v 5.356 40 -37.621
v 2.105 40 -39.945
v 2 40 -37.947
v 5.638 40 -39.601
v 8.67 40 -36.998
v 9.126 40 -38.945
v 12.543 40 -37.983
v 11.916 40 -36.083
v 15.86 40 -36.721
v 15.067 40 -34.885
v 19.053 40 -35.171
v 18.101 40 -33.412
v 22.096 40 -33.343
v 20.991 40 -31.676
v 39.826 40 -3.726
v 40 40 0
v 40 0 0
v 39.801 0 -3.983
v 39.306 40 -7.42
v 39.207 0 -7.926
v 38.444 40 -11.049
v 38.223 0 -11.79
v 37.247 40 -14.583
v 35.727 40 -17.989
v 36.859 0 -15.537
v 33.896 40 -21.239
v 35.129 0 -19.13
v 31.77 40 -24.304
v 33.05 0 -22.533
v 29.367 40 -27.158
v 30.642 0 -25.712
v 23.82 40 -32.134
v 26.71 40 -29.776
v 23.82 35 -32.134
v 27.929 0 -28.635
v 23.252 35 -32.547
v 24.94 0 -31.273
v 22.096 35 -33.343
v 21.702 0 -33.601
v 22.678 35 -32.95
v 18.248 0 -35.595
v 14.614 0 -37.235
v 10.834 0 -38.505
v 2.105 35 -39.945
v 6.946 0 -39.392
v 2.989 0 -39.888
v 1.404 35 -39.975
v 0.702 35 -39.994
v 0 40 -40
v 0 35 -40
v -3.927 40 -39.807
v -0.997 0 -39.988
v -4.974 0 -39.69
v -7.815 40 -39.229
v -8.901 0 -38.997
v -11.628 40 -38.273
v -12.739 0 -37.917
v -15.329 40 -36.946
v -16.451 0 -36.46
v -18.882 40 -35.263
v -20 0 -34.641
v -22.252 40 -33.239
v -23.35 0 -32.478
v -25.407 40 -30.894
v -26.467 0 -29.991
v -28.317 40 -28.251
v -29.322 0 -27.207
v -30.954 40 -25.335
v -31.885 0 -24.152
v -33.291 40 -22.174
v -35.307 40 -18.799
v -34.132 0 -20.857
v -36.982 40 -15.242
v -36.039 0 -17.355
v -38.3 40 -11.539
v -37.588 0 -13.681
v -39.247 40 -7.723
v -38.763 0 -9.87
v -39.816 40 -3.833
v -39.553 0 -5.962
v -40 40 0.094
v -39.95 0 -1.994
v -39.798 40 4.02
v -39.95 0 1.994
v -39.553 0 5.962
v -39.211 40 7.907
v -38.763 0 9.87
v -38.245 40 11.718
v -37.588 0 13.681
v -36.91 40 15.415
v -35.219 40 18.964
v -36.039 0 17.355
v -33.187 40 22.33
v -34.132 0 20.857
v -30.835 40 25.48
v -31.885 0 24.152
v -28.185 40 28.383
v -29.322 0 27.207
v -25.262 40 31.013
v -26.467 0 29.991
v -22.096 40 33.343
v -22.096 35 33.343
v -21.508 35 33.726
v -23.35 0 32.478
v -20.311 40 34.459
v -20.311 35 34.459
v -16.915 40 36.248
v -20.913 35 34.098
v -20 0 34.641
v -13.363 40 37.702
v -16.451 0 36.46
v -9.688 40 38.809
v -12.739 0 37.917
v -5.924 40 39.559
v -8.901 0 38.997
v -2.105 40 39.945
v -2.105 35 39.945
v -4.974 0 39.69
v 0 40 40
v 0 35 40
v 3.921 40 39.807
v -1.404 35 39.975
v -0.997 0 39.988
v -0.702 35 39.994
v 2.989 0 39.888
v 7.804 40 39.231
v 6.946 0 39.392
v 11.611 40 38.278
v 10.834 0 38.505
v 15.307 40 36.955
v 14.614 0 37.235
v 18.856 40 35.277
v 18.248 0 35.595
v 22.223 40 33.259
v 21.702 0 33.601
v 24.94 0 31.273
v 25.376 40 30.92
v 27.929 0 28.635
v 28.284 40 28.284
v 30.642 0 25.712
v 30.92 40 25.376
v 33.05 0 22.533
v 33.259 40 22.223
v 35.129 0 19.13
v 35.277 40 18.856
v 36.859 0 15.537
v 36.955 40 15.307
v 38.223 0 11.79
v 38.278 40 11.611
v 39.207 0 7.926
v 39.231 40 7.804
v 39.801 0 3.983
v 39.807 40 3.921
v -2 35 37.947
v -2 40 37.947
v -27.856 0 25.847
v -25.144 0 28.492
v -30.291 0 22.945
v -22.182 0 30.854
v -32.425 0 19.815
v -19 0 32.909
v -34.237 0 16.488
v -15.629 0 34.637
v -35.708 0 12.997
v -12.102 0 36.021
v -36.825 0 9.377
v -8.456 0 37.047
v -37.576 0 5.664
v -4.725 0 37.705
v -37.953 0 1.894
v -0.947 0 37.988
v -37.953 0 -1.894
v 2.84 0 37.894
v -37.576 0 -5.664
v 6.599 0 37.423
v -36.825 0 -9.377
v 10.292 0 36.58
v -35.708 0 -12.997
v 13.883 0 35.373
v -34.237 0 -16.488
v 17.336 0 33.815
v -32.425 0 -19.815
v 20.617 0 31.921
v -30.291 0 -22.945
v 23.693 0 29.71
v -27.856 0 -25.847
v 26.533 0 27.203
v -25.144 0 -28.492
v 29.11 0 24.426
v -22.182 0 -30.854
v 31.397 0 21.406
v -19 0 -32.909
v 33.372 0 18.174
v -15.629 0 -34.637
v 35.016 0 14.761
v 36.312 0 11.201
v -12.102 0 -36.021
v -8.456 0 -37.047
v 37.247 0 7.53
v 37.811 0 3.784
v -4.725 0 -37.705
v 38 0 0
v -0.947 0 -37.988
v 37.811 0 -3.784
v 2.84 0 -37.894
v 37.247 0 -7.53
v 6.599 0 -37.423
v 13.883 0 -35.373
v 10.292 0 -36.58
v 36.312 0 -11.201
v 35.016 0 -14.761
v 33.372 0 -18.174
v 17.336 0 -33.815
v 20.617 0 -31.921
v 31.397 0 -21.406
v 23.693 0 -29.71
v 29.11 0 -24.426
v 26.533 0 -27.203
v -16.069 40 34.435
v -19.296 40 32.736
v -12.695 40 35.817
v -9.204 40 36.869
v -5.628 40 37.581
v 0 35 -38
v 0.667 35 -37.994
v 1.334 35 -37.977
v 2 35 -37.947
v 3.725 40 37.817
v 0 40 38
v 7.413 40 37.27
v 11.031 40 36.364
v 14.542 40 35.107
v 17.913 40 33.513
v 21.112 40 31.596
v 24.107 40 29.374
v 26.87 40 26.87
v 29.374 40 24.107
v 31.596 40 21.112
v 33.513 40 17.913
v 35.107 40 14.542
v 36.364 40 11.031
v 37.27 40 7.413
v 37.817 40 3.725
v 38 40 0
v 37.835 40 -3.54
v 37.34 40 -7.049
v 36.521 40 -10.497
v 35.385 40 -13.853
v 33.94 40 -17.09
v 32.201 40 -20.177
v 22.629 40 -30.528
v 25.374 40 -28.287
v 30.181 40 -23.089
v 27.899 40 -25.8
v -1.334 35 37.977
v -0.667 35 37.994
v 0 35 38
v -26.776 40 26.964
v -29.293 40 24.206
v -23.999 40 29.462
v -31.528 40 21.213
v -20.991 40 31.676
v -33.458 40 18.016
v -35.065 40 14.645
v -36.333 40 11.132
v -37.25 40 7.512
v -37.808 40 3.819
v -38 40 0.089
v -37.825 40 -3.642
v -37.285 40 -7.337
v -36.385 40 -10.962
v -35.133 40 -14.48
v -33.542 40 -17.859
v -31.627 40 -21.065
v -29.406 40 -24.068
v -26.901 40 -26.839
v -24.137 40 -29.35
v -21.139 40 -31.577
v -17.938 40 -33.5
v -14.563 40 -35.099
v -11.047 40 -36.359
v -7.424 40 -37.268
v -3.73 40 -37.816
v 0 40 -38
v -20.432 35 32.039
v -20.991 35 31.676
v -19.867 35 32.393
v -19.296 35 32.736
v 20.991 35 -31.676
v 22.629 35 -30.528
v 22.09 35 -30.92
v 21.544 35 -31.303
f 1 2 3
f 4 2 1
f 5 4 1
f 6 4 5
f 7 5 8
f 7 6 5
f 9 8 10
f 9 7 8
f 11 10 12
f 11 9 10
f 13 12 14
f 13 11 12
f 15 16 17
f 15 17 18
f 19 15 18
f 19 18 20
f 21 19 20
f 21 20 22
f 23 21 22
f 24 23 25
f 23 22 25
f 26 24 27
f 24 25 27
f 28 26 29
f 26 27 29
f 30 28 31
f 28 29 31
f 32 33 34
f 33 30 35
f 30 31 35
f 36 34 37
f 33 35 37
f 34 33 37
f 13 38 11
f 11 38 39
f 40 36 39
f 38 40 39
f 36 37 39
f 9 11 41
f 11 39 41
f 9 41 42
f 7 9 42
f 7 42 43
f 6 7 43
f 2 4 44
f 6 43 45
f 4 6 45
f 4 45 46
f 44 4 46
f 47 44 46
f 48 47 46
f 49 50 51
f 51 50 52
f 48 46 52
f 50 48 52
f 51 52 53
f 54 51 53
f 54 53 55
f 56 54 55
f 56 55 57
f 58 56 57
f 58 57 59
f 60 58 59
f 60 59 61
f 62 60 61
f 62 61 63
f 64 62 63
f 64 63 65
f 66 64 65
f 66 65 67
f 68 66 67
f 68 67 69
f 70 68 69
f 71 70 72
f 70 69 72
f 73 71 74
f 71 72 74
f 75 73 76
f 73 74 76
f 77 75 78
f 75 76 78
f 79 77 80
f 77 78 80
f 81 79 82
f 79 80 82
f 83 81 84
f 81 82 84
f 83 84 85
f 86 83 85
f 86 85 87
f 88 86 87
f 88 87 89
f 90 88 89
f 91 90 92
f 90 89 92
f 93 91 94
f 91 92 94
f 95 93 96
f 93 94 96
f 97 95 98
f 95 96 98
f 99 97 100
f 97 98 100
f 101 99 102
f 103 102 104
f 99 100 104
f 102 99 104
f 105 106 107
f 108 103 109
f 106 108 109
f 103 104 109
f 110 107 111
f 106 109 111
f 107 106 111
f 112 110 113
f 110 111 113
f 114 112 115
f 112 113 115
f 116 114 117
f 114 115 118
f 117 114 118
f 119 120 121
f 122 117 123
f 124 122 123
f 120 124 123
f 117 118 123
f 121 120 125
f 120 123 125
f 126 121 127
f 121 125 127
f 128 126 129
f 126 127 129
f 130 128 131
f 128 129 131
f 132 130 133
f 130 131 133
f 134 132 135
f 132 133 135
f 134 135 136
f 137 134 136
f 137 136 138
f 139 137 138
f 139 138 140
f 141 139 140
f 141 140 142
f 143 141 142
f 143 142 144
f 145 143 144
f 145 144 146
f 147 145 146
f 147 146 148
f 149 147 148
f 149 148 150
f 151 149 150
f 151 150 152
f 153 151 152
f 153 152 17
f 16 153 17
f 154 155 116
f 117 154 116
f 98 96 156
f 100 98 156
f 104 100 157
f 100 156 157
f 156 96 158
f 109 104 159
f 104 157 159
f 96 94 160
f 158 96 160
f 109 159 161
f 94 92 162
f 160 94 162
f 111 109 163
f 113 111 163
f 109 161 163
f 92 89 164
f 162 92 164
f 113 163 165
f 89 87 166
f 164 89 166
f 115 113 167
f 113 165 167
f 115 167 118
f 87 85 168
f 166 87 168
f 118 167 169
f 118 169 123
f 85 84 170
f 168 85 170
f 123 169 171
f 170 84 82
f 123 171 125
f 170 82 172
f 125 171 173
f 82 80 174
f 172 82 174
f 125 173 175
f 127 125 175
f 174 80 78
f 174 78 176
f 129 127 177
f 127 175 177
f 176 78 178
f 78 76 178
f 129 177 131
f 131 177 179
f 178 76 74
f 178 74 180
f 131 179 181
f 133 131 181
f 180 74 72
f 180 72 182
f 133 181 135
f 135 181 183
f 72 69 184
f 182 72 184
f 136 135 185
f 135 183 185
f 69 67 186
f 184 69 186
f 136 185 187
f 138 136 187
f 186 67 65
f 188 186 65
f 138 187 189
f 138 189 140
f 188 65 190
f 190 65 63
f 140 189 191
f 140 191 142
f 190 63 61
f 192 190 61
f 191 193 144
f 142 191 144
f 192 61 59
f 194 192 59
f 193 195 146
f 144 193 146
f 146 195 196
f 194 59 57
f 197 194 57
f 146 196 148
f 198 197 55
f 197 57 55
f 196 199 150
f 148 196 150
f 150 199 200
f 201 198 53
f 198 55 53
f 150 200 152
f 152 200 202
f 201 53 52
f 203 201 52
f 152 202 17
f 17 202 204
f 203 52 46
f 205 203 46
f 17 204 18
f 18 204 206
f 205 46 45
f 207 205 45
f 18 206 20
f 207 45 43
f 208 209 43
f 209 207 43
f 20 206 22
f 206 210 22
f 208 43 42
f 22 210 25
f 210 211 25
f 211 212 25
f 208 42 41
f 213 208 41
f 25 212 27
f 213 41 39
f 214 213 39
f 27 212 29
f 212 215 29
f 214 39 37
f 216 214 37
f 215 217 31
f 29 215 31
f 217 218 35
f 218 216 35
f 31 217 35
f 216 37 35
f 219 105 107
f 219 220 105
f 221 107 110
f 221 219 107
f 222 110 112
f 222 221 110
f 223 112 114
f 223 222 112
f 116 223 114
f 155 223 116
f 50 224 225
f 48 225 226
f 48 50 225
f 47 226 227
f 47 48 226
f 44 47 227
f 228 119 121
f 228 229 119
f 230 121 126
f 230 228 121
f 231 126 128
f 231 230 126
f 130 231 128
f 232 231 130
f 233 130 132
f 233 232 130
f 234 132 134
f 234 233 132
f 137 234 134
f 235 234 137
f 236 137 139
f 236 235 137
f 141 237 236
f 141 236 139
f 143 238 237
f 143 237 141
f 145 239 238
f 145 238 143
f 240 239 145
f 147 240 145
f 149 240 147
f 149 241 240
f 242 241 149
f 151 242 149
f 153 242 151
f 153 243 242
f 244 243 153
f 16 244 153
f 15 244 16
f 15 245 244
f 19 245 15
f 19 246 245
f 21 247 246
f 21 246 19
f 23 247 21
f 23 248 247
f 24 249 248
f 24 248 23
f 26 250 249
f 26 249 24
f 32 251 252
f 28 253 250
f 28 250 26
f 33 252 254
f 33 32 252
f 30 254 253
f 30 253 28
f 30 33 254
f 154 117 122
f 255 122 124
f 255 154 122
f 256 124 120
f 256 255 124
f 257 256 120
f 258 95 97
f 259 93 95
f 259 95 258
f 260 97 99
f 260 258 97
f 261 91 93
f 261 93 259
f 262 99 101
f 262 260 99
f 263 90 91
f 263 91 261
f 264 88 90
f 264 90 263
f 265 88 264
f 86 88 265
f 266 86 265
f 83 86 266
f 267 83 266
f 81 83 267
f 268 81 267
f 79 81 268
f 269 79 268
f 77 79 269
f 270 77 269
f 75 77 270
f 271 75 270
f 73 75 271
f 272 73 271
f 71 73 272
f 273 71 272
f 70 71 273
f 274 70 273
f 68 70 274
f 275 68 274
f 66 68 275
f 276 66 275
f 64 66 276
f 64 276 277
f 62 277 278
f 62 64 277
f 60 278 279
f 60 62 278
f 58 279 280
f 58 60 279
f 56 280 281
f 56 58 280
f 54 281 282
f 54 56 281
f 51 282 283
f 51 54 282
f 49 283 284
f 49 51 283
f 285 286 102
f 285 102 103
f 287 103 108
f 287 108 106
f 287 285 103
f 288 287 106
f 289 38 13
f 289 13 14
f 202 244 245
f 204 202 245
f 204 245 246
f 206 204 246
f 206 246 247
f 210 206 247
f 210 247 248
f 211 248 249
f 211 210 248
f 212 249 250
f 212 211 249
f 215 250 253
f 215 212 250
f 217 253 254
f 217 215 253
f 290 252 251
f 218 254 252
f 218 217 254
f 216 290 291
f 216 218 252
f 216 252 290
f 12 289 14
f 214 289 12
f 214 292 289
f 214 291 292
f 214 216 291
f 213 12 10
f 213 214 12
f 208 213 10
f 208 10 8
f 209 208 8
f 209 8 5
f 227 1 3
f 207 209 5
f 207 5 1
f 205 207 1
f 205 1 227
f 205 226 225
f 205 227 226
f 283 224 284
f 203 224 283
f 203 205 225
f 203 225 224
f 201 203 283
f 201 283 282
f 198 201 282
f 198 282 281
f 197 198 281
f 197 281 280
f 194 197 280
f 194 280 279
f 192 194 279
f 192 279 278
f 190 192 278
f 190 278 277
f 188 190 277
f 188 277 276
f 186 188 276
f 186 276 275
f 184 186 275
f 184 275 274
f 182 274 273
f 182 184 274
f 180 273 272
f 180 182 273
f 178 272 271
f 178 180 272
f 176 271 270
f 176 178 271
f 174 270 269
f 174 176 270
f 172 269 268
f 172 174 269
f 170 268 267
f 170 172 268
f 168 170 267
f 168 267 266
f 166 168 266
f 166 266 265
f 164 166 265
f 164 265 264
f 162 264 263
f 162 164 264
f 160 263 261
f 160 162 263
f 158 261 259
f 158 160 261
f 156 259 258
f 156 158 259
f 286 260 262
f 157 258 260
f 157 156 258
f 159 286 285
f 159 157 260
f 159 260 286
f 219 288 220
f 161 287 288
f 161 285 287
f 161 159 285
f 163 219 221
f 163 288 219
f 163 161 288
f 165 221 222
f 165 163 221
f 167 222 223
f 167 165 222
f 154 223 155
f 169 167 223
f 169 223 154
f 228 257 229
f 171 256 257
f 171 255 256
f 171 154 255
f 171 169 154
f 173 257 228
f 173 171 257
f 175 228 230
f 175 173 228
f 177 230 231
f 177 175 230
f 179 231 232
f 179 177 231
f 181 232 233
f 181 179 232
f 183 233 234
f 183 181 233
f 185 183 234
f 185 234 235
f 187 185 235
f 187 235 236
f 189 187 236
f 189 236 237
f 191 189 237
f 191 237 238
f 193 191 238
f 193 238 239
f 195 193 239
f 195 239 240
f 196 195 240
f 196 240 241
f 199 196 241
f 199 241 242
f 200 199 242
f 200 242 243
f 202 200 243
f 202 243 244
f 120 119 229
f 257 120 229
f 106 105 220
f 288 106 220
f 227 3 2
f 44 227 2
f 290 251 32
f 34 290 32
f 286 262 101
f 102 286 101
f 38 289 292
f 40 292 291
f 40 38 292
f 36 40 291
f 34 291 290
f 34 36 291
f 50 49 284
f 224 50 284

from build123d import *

# Parameters (mm, degrees)
ESQUISSE1_R      = 40
ESQUISSE1_R_2    = 38
EXTRUSION1_DEPTH = 40
EXTRUSION2_DEPTH = 5


with BuildPart() as part:
    # Esquisse1 → Extrusion1 (new body)
    with BuildSketch(Plane(origin=(0, 0, 0), x_dir=(1, 0, 0), z_dir=(0, 1, 0))):
        Circle(ESQUISSE1_R)
        Circle(ESQUISSE1_R_2, mode=Mode.SUBTRACT)
    extrude(amount=EXTRUSION1_DEPTH)

    # Esquisse2 → Extrusion2 (cut)
    with BuildSketch(Plane(origin=(0, 40, 0), x_dir=(1, 0, 0), z_dir=(0, 1, 0))):
        with BuildLine():
            Line((0, -40), (0, -38))
            ThreePointArc((0, -38), (-1.000346681, -37.986830699), (-2, -37.947331922))
            Line((-2, -37.947331922), (-2.105263158, -39.944559918))
            ThreePointArc((-2.105263158, -39.944559918), (-1.052996506, -39.986137577), (0, -40))
        make_face()
        with BuildLine():
            Line((0, 40), (0, 38))
            ThreePointArc((0, 38), (1.000346681, 37.986830699), (2, 37.947331922))
            Line((2, 37.947331922), (2.105263158, 39.944559918))
            ThreePointArc((2.105263158, 39.944559918), (1.052996506, 39.986137577), (0, 40))
        make_face()
        with BuildLine():
            Line((22.096109748, 33.343094247), (20.991304261, 31.675939535))
            ThreePointArc((20.991304261, 31.675939535), (21.817611901, 31.112566769), (22.628807775, 30.527644172))
            Line((22.628807775, 30.527644172), (23.819797658, 32.134362286))
            ThreePointArc((23.819797658, 32.134362286), (22.965907264, 32.750070283), (22.096109748, 33.343094247))
        make_face()
        with BuildLine():
            Line((-20.311213778, -34.459463067), (-19.295653089, -32.736489913))
            ThreePointArc((-19.295653089, -32.736489913), (-20.150457189, -32.217372256), (-20.991304261, -31.675939535))
            Line((-20.991304261, -31.675939535), (-22.096109748, -33.343094247))
            ThreePointArc((-22.096109748, -33.343094247), (-21.211007567, -33.913023427), (-20.311213778, -34.459463067))
        make_face()
    extrude(amount=-EXTRUSION2_DEPTH, mode=Mode.SUBTRACT)


solid = part.part
